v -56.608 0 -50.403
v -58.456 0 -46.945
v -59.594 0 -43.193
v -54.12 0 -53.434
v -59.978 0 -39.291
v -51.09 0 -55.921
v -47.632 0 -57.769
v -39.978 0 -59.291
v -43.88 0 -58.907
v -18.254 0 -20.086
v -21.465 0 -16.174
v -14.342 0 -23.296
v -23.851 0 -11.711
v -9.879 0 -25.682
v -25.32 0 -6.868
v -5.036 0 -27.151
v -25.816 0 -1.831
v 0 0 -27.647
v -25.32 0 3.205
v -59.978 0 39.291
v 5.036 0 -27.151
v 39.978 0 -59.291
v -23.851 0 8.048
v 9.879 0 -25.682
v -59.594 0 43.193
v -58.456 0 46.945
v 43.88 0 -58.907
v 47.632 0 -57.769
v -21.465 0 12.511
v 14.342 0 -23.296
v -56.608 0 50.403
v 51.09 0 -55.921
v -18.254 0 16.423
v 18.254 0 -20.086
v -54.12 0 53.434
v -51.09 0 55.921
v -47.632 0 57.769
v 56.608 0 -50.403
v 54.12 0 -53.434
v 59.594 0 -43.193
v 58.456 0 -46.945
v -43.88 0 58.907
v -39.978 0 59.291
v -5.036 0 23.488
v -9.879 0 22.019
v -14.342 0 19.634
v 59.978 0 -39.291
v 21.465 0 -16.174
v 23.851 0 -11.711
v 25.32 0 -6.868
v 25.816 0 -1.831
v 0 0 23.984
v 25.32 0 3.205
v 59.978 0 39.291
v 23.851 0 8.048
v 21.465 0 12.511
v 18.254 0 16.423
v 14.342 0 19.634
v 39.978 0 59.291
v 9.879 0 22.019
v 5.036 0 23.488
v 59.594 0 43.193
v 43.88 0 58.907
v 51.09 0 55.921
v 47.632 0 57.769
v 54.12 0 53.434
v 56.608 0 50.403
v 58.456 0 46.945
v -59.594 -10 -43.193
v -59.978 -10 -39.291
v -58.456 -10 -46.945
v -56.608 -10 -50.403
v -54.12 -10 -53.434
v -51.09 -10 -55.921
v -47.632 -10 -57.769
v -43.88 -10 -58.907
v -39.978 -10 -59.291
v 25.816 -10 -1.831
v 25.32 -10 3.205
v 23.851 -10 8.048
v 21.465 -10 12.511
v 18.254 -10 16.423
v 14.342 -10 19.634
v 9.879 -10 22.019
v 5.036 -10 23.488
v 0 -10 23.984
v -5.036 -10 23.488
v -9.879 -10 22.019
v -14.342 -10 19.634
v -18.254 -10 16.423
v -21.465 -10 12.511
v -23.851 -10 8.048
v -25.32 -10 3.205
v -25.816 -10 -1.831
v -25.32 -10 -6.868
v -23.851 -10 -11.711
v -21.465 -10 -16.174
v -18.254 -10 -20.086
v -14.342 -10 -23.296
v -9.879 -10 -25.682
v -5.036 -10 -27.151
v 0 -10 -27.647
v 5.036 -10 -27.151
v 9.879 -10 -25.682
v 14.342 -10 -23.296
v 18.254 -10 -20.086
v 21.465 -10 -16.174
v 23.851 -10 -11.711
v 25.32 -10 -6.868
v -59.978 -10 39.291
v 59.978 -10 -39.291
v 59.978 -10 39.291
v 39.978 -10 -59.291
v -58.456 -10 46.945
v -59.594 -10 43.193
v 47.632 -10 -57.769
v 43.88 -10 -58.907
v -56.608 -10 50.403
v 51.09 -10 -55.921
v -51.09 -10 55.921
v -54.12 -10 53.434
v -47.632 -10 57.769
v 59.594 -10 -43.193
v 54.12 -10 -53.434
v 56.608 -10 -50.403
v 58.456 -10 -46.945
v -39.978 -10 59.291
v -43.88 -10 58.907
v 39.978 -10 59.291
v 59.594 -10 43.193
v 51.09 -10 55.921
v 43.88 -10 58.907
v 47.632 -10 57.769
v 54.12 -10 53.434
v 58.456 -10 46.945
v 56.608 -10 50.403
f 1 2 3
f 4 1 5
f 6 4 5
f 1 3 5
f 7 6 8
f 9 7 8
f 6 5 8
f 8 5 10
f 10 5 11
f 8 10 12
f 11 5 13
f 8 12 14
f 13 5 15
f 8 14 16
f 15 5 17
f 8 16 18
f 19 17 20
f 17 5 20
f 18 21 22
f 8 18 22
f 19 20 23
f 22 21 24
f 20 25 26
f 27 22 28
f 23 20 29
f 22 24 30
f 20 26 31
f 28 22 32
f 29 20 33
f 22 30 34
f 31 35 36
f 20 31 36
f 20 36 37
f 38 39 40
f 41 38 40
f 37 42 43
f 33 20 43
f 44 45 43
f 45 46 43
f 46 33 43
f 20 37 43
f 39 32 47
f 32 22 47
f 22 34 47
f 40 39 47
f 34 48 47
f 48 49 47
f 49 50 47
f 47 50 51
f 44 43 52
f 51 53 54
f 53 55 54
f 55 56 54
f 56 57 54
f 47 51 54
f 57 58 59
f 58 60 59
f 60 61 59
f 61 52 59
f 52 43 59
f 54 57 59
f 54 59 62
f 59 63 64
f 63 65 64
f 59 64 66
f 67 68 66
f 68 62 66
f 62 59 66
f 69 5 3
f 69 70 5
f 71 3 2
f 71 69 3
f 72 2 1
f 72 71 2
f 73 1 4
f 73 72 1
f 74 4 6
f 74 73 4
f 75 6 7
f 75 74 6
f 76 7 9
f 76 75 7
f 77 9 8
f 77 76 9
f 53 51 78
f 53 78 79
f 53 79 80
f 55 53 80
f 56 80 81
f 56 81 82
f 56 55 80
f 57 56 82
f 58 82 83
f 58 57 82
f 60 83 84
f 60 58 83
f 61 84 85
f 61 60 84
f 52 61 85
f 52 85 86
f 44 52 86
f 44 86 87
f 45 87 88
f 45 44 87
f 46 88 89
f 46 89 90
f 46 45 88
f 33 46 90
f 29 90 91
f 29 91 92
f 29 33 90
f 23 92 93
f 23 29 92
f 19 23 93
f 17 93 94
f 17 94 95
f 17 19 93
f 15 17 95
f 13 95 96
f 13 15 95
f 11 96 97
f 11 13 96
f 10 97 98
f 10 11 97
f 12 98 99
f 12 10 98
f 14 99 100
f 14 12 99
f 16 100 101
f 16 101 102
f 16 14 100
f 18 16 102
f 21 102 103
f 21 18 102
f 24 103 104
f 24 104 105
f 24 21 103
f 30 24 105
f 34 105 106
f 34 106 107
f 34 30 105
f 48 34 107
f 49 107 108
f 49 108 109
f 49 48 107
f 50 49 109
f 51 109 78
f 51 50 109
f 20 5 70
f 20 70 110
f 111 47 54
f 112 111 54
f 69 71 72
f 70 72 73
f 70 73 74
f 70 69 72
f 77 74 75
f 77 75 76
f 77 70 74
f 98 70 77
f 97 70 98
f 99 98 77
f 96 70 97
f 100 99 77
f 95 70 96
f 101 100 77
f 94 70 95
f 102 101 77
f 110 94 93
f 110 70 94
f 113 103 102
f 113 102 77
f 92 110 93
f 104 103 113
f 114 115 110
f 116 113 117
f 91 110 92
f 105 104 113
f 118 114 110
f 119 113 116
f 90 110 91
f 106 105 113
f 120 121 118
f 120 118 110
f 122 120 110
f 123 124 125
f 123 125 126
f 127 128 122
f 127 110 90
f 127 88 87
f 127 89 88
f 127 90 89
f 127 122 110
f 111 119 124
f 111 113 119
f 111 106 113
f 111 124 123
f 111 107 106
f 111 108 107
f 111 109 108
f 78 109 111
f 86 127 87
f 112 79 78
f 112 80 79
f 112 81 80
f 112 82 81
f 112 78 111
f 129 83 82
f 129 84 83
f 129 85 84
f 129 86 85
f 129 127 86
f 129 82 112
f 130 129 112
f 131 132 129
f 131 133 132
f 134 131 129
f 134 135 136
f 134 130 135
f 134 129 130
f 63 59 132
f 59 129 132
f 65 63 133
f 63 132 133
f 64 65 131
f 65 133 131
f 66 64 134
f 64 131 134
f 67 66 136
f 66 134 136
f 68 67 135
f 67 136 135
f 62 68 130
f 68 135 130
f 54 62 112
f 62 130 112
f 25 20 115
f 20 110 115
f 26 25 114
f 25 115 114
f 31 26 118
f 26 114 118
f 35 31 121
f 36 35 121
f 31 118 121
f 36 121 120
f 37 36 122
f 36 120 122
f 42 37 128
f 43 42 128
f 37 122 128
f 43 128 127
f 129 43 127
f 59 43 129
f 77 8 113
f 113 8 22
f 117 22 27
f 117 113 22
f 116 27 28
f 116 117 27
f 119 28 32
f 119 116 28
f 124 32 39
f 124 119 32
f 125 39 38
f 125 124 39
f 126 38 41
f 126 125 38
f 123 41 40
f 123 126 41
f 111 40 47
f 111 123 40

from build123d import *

# Parameters (mm, degrees)
F0_W     = 119.956396
F0_H     = 118.582852
F0_R     = 25.815734
F1_DEPTH = 10
F2_R     = 20


with BuildPart() as f1:
    # F0 (on Front) → F1 (new body)
    with BuildSketch(Plane.XZ):
        Rectangle(F0_W, F0_H)
        with Locations((0, -1.831395)):
            Circle(F0_R, mode=Mode.SUBTRACT)
    extrude(amount=F1_DEPTH)

    # F2
    f2_edges = [f1.edges().sort_by_distance(p)[0] for p in [
        (-59.978198, -5, 59.291426),
        (59.978198, -5, 59.291426),
        (-59.978198, -5, -59.291426),
        (59.978198, -5, -59.291426),
    ]]
    fillet(f2_edges, radius=F2_R)


solid = f1.part
